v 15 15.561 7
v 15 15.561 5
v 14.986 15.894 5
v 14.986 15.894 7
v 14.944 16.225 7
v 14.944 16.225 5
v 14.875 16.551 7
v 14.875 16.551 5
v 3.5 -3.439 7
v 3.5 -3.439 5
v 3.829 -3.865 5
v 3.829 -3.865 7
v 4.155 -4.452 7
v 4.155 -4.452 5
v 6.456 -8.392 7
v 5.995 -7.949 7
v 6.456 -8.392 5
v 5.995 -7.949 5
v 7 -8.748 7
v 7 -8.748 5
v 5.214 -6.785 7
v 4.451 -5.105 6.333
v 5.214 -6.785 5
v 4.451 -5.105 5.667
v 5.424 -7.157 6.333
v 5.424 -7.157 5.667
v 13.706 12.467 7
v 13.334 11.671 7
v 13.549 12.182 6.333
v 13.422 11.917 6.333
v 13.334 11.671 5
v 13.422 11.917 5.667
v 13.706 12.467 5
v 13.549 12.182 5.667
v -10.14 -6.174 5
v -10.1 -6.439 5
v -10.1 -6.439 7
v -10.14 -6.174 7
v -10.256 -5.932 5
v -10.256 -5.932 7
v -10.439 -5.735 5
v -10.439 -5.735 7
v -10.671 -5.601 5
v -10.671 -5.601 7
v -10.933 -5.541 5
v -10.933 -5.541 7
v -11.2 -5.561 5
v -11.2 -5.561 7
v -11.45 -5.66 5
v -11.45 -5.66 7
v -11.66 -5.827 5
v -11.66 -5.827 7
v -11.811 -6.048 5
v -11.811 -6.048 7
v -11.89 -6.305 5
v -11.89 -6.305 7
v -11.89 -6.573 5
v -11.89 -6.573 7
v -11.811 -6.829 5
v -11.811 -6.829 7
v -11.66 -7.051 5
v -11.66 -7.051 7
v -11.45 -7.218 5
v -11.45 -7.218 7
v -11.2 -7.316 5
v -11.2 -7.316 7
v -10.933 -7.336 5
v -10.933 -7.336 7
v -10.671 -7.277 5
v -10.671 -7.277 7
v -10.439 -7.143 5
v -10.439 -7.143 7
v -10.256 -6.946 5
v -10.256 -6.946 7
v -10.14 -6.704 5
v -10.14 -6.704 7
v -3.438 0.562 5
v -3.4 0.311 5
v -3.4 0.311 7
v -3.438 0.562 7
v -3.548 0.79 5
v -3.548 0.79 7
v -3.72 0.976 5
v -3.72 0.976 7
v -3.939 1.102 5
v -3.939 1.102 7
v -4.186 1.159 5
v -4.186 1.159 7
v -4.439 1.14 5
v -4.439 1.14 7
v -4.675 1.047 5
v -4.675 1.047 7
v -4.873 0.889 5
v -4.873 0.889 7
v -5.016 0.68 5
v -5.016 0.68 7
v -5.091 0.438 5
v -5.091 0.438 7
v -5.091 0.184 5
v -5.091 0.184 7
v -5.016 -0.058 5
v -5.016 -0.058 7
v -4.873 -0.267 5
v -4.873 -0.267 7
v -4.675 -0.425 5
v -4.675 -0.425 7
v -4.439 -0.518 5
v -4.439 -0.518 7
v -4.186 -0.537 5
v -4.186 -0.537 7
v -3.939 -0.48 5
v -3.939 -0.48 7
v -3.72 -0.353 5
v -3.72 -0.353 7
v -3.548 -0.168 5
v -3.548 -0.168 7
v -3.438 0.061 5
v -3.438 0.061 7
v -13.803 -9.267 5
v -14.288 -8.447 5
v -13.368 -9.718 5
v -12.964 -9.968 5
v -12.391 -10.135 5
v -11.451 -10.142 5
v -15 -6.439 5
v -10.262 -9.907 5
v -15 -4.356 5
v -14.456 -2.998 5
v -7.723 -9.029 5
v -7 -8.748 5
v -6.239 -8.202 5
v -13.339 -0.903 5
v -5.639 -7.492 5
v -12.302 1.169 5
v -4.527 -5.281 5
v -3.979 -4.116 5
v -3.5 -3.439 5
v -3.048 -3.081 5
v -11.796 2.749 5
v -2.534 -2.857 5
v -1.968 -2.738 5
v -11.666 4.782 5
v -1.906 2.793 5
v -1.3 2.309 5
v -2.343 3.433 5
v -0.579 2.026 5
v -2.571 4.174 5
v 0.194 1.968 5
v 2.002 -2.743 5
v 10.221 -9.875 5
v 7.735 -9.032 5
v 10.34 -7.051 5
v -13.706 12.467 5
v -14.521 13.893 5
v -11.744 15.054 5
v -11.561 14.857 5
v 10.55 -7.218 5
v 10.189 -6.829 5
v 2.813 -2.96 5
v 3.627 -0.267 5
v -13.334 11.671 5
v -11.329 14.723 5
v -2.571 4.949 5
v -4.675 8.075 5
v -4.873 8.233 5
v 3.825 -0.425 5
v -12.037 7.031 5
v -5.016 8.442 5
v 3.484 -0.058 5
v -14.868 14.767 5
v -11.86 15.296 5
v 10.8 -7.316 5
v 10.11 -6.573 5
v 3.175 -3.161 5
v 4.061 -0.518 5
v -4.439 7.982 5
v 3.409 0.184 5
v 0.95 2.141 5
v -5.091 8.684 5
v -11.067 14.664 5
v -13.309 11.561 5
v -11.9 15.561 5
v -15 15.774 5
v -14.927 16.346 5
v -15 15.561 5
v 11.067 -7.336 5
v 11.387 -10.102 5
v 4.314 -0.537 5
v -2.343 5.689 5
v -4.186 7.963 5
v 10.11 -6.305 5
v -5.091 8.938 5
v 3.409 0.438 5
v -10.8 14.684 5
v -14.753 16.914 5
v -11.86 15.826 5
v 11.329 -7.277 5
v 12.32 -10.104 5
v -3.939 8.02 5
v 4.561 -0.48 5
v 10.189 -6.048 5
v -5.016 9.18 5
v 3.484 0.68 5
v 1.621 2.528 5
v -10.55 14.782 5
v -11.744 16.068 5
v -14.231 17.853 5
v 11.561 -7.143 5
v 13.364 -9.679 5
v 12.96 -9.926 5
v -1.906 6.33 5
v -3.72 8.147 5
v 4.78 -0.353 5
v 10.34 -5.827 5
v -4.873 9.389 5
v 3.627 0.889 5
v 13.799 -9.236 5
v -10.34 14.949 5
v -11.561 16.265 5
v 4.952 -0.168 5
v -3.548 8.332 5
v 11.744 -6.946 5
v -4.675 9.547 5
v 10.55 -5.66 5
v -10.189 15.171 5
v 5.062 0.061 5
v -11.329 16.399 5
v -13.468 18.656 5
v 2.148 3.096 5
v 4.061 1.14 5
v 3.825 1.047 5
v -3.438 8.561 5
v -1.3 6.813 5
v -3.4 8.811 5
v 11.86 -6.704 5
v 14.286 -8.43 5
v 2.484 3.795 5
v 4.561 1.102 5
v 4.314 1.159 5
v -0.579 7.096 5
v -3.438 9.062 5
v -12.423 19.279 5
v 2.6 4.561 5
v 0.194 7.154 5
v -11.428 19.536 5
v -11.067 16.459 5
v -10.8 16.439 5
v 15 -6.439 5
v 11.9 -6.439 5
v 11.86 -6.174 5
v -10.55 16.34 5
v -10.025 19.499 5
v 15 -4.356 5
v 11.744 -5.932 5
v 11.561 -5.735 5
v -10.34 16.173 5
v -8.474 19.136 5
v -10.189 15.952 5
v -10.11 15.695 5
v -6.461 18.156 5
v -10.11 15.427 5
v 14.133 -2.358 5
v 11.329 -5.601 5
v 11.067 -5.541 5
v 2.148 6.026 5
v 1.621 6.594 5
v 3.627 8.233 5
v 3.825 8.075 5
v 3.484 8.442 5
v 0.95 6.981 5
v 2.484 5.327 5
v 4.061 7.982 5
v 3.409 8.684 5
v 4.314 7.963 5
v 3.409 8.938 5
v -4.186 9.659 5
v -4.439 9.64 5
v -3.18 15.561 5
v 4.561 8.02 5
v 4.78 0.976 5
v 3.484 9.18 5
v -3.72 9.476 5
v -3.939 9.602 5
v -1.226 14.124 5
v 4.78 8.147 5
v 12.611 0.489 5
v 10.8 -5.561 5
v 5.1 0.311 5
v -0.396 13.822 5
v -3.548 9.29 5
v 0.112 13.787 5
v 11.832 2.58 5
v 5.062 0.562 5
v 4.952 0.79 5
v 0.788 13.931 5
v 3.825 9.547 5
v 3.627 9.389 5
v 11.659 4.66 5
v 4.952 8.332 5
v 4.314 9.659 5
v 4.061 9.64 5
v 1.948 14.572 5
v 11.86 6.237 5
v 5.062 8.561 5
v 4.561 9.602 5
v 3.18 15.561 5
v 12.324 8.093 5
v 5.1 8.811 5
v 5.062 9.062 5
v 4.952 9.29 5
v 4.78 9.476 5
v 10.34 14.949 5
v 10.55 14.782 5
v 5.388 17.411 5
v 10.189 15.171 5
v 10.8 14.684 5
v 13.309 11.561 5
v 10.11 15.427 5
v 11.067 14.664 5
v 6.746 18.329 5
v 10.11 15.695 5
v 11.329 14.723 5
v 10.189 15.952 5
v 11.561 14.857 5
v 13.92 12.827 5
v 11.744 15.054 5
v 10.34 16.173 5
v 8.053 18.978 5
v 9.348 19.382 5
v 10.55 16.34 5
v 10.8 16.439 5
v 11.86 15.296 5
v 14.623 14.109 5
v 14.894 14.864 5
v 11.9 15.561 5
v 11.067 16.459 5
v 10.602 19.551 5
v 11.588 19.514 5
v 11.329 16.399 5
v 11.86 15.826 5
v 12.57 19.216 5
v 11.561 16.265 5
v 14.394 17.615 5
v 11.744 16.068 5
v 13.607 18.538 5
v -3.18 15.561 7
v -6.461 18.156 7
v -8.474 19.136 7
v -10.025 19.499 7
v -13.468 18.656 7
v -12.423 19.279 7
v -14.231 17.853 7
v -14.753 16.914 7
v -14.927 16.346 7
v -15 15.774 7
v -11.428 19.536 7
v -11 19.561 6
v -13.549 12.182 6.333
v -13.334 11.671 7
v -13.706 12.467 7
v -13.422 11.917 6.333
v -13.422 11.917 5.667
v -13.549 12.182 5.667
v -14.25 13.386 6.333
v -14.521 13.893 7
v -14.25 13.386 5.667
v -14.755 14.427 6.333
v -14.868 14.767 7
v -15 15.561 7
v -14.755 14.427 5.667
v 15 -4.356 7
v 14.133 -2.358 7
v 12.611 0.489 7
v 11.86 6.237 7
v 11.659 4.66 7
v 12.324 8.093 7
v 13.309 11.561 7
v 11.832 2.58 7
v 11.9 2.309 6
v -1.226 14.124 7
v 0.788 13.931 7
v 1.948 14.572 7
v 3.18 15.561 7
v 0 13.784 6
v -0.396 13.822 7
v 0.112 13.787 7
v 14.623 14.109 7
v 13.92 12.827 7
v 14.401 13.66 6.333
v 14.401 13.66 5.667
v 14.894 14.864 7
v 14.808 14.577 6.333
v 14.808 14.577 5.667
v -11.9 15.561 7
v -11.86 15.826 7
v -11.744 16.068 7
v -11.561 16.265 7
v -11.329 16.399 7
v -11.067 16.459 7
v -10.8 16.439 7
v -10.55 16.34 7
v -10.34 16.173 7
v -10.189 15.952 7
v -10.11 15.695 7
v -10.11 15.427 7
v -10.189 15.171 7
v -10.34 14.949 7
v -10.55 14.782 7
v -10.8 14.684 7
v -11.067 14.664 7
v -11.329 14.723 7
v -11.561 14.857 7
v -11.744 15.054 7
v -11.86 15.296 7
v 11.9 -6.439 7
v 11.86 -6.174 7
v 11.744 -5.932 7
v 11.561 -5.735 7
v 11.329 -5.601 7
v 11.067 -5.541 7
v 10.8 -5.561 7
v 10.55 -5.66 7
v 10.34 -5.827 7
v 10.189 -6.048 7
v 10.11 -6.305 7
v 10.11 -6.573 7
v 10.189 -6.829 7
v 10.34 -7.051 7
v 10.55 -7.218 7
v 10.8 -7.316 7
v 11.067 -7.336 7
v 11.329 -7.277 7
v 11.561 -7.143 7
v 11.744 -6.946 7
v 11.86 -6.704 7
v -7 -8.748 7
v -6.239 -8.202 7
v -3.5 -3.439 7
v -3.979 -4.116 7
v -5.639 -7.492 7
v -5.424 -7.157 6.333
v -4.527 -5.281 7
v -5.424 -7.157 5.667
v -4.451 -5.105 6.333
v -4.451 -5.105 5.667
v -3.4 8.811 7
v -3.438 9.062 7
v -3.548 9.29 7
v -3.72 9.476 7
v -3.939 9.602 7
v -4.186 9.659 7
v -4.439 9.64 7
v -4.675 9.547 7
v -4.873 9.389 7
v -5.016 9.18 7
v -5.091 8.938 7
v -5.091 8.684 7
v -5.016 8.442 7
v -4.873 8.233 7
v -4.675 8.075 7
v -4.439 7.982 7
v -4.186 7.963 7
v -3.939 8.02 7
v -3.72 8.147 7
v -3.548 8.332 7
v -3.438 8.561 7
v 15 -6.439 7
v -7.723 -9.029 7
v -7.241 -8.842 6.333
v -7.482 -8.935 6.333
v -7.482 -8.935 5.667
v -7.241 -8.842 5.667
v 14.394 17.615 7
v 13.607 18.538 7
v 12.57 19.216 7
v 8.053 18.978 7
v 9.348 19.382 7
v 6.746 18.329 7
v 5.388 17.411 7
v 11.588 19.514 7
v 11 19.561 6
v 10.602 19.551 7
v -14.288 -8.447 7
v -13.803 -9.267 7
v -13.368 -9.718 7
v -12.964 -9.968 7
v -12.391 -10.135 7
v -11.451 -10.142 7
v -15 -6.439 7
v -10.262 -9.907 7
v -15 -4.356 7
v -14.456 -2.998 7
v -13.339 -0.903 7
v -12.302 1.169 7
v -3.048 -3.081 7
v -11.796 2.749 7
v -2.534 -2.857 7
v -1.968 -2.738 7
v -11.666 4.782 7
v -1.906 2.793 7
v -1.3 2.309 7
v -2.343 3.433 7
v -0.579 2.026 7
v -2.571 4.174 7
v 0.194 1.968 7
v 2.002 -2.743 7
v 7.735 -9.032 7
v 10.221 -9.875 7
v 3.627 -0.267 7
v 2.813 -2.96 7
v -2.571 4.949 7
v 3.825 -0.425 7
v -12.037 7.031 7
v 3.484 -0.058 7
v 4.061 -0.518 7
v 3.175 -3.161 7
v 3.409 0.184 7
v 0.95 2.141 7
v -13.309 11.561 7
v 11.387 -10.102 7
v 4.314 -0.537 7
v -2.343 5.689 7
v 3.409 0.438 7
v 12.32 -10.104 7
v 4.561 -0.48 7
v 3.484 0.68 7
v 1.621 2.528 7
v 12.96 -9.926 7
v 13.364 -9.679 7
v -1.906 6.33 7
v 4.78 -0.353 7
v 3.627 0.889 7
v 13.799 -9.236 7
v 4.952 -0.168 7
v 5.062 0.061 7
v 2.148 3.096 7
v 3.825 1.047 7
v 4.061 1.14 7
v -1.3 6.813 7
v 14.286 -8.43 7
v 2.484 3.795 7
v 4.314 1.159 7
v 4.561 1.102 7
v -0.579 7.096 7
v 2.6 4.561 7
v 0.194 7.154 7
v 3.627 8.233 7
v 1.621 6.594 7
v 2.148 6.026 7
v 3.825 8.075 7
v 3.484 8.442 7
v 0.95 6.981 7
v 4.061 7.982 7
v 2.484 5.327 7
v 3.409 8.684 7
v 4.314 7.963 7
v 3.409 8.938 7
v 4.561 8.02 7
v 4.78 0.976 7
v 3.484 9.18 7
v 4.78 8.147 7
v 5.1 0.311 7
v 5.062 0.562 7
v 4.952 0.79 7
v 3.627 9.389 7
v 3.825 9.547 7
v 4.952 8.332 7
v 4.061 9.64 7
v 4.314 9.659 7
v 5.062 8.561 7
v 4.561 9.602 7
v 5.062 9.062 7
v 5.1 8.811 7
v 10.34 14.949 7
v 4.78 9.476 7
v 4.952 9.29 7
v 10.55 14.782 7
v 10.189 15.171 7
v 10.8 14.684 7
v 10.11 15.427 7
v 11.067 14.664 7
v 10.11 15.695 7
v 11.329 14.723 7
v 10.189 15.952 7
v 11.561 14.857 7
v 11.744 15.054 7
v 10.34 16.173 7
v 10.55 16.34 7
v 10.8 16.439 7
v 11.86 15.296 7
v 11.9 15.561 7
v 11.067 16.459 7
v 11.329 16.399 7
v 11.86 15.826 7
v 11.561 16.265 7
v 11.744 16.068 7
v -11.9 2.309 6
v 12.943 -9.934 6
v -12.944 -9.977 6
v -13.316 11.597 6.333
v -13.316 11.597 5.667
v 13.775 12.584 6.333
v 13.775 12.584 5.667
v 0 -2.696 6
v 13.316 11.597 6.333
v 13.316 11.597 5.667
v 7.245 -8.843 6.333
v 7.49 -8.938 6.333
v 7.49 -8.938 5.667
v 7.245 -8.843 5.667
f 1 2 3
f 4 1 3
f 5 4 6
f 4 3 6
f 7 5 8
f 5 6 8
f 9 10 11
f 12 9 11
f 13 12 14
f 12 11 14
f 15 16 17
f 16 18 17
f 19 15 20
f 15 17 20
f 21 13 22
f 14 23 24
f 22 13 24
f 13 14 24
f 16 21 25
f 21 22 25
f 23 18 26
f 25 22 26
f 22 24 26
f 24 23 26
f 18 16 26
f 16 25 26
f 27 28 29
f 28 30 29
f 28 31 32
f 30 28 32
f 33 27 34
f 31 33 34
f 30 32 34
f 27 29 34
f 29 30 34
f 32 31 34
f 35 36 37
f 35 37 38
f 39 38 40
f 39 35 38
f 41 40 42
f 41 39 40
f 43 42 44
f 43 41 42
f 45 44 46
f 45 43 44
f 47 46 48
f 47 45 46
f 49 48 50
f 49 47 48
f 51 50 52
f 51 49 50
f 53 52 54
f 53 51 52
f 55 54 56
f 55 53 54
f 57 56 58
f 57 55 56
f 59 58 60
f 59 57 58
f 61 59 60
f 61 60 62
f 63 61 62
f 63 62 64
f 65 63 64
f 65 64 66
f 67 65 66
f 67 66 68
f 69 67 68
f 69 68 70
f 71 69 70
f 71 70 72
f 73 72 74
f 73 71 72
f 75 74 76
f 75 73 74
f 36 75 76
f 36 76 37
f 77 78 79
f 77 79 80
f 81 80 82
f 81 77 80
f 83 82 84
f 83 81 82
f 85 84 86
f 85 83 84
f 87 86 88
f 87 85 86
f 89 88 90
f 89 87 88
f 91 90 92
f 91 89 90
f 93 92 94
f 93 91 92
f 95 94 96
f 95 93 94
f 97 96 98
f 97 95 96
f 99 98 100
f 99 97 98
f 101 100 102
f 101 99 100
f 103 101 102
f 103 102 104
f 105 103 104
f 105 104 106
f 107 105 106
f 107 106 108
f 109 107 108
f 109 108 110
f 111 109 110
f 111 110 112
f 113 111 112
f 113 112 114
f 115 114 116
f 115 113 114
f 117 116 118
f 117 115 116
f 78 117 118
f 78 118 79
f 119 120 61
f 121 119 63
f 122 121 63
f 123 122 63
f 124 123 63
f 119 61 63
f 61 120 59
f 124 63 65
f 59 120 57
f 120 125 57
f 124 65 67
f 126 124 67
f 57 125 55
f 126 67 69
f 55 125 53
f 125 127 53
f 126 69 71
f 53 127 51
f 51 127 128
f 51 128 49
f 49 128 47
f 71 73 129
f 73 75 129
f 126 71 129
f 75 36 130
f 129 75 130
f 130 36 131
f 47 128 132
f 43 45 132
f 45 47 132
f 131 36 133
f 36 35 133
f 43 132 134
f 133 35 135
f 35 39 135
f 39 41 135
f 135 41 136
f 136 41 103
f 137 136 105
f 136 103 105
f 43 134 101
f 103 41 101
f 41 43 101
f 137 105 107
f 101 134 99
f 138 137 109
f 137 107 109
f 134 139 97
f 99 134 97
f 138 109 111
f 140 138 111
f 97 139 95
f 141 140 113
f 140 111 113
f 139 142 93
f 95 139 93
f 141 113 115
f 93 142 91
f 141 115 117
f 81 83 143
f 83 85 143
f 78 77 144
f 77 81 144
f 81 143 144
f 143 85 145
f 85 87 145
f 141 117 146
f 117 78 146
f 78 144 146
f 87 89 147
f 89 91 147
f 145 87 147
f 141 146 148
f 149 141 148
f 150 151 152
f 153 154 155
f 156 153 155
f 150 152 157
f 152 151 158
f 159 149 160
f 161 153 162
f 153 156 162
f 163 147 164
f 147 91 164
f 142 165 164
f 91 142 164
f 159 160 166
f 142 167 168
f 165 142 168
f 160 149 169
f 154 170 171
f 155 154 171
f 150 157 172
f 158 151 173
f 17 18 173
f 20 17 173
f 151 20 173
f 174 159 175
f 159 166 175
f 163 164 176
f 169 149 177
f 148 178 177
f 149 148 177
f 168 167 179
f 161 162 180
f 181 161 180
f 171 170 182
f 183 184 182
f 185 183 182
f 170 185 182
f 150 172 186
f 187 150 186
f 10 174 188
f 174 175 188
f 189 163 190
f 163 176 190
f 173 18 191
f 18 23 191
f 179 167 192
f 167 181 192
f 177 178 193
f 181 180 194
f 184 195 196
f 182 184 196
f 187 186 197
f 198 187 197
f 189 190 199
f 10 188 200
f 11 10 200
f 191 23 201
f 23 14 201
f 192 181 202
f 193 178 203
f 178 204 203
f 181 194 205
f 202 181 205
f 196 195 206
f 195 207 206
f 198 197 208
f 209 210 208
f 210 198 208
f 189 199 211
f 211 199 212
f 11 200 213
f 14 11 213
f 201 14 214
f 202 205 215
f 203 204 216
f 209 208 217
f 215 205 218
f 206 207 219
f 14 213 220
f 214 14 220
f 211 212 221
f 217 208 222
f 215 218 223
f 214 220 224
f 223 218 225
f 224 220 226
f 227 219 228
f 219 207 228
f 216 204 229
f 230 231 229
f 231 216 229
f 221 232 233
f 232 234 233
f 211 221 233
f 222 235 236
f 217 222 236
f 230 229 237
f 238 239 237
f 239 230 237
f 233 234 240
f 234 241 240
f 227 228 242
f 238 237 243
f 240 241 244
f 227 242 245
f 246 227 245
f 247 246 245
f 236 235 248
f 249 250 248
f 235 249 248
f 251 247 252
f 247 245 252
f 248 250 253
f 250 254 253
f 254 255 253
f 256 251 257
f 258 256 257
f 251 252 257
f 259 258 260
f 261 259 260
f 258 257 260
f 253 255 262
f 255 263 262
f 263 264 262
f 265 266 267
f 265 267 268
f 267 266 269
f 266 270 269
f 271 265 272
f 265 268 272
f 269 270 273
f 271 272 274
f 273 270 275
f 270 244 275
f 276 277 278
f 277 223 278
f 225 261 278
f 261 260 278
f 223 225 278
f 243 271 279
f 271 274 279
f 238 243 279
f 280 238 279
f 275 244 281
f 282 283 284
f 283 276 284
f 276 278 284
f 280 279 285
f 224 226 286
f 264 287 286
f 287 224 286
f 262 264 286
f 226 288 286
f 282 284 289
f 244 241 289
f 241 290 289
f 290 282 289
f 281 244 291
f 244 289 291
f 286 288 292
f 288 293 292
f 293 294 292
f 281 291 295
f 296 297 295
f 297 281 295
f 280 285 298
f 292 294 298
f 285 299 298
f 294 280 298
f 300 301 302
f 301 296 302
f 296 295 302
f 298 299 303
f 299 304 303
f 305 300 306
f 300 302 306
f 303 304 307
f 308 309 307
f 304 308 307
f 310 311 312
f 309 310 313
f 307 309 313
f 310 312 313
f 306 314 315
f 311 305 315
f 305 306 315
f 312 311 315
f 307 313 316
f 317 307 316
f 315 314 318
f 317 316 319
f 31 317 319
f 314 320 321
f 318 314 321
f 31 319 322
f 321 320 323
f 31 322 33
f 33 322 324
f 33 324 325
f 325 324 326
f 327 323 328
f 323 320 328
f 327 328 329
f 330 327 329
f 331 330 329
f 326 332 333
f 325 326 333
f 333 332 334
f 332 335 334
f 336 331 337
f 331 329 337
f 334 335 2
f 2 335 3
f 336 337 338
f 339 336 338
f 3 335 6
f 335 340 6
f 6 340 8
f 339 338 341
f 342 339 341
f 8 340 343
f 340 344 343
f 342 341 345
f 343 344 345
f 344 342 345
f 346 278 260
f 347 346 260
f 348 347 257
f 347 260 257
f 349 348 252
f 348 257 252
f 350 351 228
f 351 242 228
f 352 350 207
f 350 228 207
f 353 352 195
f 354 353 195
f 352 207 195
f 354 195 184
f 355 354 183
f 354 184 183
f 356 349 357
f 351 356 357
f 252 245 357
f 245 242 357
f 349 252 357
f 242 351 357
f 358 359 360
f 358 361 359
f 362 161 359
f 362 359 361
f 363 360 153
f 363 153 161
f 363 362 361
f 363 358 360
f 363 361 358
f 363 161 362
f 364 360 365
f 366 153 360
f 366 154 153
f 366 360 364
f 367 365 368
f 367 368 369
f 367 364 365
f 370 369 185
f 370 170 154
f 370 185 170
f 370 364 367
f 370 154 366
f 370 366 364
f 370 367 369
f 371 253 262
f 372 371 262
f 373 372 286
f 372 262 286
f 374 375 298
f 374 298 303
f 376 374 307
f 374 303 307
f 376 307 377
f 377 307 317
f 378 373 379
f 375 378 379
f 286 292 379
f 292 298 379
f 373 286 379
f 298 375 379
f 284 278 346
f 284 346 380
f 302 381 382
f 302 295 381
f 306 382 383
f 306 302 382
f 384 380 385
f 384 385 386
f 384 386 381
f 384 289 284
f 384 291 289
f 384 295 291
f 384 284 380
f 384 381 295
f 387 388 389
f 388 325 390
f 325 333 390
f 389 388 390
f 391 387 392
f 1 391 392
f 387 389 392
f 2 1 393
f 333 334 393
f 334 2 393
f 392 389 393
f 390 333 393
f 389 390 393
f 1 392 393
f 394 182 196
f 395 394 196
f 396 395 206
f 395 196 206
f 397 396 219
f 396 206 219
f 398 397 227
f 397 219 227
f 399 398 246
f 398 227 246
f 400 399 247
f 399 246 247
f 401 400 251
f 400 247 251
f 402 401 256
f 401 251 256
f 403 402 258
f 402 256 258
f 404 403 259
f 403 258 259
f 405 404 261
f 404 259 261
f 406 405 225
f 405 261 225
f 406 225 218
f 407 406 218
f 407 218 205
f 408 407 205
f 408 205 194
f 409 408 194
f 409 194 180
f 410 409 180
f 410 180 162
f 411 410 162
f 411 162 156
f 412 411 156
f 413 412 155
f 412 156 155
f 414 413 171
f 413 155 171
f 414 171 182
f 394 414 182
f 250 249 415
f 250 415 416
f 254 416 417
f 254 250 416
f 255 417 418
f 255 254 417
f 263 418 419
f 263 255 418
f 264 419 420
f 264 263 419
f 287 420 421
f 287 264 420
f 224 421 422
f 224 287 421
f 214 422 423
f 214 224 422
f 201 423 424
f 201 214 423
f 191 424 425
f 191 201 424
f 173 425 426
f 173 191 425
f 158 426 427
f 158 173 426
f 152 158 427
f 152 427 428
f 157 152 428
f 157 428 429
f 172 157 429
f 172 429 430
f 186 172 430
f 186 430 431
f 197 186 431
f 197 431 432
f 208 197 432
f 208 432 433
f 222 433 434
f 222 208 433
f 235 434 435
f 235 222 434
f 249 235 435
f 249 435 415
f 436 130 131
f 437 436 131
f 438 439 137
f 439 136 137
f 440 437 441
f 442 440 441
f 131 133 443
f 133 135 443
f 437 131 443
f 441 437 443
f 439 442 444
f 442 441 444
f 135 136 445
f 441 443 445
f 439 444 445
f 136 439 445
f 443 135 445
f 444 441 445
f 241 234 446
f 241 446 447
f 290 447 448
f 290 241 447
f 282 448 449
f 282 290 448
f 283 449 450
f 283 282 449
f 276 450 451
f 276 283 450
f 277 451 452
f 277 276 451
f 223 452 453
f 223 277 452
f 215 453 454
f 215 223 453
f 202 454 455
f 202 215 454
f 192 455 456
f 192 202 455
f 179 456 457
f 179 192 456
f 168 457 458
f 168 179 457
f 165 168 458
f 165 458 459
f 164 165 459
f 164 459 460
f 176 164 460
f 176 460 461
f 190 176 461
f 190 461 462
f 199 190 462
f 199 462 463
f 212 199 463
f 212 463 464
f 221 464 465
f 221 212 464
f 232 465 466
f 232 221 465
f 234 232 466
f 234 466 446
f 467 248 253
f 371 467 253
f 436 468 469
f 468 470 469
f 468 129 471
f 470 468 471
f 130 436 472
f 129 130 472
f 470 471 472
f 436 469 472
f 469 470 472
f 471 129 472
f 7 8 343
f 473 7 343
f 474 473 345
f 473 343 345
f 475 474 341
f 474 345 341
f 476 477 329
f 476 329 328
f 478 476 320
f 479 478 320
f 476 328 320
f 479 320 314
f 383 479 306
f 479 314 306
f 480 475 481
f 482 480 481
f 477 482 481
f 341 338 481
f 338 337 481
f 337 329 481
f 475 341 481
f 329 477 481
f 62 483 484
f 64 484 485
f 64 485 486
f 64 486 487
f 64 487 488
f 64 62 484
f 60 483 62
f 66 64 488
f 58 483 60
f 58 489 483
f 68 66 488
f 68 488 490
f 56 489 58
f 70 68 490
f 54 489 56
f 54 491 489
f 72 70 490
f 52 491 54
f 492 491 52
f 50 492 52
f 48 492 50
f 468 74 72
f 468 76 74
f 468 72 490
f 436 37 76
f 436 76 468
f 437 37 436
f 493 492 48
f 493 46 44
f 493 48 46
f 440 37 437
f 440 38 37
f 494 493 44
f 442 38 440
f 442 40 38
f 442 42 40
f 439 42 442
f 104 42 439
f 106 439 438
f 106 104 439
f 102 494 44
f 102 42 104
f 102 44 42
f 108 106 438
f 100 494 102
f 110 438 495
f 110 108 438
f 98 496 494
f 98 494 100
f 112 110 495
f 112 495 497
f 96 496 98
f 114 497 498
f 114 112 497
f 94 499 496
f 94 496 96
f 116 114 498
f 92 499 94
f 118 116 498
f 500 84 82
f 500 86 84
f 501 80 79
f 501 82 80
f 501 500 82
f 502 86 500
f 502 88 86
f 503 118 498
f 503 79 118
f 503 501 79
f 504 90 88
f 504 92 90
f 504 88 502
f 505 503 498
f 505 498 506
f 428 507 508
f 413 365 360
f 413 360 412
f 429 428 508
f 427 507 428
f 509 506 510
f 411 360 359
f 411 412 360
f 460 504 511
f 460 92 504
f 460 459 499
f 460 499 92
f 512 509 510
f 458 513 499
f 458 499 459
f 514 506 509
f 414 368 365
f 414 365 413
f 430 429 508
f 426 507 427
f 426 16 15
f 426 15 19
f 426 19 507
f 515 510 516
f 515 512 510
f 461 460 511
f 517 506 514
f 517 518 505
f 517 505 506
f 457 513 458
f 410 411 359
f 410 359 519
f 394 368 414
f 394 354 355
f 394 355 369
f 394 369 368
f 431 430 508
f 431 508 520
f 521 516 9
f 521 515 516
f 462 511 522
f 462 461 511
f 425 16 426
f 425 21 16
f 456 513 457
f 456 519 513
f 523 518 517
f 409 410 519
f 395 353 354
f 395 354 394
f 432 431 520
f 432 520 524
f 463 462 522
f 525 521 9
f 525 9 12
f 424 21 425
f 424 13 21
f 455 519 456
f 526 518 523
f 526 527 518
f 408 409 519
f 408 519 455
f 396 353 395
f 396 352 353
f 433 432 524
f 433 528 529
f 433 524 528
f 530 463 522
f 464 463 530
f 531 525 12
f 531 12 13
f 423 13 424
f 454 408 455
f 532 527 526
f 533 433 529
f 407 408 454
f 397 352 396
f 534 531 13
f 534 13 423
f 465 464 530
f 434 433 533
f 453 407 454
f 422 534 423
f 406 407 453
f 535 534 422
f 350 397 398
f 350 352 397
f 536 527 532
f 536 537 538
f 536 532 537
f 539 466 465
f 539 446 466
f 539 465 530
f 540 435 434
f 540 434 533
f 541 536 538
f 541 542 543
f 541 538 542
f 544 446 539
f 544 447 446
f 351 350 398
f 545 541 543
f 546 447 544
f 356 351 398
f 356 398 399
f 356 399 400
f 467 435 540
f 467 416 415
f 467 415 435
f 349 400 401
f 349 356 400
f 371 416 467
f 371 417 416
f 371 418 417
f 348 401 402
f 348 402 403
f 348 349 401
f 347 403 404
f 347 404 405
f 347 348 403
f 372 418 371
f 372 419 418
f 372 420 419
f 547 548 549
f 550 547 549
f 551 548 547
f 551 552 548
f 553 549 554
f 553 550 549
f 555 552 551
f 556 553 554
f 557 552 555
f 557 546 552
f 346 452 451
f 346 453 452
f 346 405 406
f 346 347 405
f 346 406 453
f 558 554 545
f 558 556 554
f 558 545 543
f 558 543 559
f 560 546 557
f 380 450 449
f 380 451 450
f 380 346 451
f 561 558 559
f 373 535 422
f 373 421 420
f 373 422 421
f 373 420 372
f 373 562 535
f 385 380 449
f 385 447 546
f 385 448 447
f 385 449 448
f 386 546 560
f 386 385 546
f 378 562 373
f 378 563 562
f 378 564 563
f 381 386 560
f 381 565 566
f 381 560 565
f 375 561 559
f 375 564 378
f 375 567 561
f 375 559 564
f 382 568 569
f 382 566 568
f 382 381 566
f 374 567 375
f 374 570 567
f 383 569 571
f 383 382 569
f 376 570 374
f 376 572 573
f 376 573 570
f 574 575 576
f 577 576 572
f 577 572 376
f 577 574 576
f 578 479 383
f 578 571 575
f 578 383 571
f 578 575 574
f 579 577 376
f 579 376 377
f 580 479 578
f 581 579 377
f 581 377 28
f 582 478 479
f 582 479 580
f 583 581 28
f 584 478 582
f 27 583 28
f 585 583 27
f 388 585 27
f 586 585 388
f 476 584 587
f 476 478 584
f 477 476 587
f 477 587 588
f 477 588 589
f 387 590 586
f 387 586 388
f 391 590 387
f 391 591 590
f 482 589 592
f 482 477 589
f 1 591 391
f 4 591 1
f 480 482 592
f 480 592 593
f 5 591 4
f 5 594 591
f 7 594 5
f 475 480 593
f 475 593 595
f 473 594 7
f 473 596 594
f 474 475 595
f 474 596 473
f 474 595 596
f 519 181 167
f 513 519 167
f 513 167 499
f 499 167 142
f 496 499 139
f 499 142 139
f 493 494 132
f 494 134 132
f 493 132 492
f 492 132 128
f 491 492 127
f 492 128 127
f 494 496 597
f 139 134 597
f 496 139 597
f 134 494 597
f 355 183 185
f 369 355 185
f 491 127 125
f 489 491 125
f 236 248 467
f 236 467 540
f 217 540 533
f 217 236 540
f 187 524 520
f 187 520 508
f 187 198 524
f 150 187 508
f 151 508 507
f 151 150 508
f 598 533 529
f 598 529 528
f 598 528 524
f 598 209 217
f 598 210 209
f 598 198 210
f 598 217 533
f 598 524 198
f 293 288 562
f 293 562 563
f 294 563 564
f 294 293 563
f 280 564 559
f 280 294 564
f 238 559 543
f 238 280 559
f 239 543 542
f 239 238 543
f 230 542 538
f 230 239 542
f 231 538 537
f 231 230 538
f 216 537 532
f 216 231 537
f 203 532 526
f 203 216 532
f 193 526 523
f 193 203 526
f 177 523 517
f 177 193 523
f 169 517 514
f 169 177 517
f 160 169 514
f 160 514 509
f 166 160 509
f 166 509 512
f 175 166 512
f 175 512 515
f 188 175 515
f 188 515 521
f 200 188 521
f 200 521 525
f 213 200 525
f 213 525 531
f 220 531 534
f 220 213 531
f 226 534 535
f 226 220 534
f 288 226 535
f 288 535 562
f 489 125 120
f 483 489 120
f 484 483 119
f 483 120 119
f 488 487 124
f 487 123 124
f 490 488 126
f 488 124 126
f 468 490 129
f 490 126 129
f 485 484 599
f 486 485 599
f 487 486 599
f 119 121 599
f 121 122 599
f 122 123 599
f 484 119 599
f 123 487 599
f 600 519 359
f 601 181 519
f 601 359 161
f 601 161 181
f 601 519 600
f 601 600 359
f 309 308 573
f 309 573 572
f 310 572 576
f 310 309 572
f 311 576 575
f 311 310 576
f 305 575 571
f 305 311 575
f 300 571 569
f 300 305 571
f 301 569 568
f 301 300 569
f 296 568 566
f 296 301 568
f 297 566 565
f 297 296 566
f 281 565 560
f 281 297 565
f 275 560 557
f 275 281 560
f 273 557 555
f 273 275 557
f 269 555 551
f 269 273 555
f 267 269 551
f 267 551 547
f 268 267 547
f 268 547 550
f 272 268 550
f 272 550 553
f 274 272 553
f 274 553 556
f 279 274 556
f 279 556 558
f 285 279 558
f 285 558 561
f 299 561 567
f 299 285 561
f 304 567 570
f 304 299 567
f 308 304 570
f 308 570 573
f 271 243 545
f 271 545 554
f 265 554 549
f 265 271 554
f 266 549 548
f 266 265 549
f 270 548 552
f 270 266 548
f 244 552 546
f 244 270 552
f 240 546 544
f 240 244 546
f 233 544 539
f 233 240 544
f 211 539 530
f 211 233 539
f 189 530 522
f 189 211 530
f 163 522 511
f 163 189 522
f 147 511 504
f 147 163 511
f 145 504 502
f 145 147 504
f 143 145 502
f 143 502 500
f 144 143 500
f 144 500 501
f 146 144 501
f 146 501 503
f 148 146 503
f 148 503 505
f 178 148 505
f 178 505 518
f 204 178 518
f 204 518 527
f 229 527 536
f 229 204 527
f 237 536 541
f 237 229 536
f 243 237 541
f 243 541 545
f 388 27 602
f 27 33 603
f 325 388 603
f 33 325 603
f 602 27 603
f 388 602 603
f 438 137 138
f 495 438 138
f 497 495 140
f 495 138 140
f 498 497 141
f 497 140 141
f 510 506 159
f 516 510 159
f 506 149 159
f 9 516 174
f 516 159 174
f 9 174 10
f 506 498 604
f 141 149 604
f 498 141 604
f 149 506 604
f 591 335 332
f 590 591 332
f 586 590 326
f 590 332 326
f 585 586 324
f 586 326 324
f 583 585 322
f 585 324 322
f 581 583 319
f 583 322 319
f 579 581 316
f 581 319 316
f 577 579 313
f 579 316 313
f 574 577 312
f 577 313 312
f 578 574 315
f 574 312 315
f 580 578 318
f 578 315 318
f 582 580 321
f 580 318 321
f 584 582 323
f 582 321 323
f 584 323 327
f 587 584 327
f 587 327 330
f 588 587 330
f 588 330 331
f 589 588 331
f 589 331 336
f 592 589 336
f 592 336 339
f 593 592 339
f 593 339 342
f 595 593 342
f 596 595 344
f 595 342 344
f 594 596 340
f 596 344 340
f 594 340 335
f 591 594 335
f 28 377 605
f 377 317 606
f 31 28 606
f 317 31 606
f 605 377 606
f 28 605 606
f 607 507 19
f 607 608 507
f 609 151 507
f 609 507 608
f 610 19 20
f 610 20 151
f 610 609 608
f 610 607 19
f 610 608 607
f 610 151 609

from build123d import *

# Parameters (mm, degrees)
F3_R     = 0.9
F3_R_2   = 0.85
F3_R_3   = 2.6
F4_DEPTH = 2


with BuildPart() as f4:
    # F3 (on offset) → F4 (new body)
    with BuildSketch(Plane.XY.offset(5)):
        with BuildLine():
            add(Edge.make_bspline(
                [(13.5840897294, 15.5610671266), (13.3511585546, 17.1029676873), (12.6074515763, 18.5088140753), (11, 19.5610671266)],
                knots=[0.7544415636, 0.7544415636, 0.7544415636, 0.7544415636, 0.7967305031, 0.7967305031, 0.7967305031, 0.7967305031], degree=3))
            ThreePointArc((11, 19.5610671266), (8.1715728753, 18.3894942513), (7, 15.5610671266))
            Line((7, 15.5610671266), (10.1, 15.5610671266))
            ThreePointArc((10.1, 15.5610671266), (11, 16.4610671266), (11.9, 15.5610671266))
            Line((11.9, 15.5610671266), (13.5840897294, 15.5610671266))
        make_face()
        with BuildLine():
            add(Edge.make_bspline(
                [(14.8754677726, 16.5513951244), (14.4362064353, 18.1121245067), (12.8992511156, 19.5610671266), (11, 19.5610671266)],
                knots=[0.5598679958, 0.5598679958, 0.5598679958, 0.5598679958, 1, 1, 1, 1], degree=3))
            add(Edge.make_bspline(
                [(13.5840897294, 15.5610671266), (13.3511585546, 17.1029676873), (12.6074515763, 18.5088140753), (11, 19.5610671266)],
                knots=[0.7544415636, 0.7544415636, 0.7544415636, 0.7544415636, 0.7967305031, 0.7967305031, 0.7967305031, 0.7967305031], degree=3))
            Line((13.5840897294, 15.5610671266), (15, 15.5610671266))
            ThreePointArc((15, 15.5610671266), (14.9687448325, 16.0601307044), (14.8754677726, 16.5513951244))
        make_face()
        with BuildLine():
            ThreePointArc((7, 15.5610671266), (8.1715728753, 18.3894942513), (11, 19.5610671266))
            add(Edge.make_bspline(
                [(3.1801327541, 15.5610671266), (5.1521059489, 17.258924835), (7.5281581703, 19.5610671266), (11, 19.5610671266)],
                knots=[0.6843780155, 0.6843780155, 0.6843780155, 0.6843780155, 1, 1, 1, 1], degree=3))
            Line((3.1801327541, 15.5610671266), (7, 15.5610671266))
        make_face()
        with BuildLine():
            add(Edge.make_bspline(
                [(-11, 19.5610671266), (-7.5281581703, 19.5610671266), (-5.1521059489, 17.258924835), (-3.1801327541, 15.5610671266)],
                knots=[0, 0, 0, 0, 0.3156219845, 0.3156219845, 0.3156219845, 0.3156219845], degree=3))
            add(Edge.make_bspline(
                [(-11, 19.5610671266), (-12.6074515763, 18.5088140753), (-13.3511585546, 17.1029676873), (-13.5840897294, 15.5610671266)],
                knots=[0.9225775171, 0.9225775171, 0.9225775171, 0.9225775171, 0.9648664566, 0.9648664566, 0.9648664566, 0.9648664566], degree=3))
            Line((-13.5840897294, 15.5610671266), (-11.9, 15.5610671266))
            ThreePointArc((-11.9, 15.5610671266), (-11, 16.4610671266), (-10.1, 15.5610671266))
            Line((-10.1, 15.5610671266), (-3.1801327541, 15.5610671266))
        make_face()
        with BuildLine():
            add(Edge.make_bspline(
                [(-11, 19.5610671266), (-12.6074515763, 18.5088140753), (-13.3511585546, 17.1029676873), (-13.5840897294, 15.5610671266)],
                knots=[0.9225775171, 0.9225775171, 0.9225775171, 0.9225775171, 0.9648664566, 0.9648664566, 0.9648664566, 0.9648664566], degree=3))
            add(Edge.make_bspline(
                [(-15, 15.7741791911), (-14.9345041339, 17.5934219618), (-13.2132485479, 19.5610671266), (-11, 19.5610671266)],
                knots=[0.4871023051, 0.4871023051, 0.4871023051, 0.4871023051, 1, 1, 1, 1], degree=3))
            Line((-15, 15.7741791911), (-15, 15.5610671266))
            Line((-15, 15.5610671266), (-13.5840897294, 15.5610671266))
        make_face()
        with BuildLine():
            Line((10.1, 15.5610671266), (7, 15.5610671266))
            ThreePointArc((7, 15.5610671266), (7.384697146, 13.8494639969), (8.4647926368, 12.4670852867))
            Line((8.4647926368, 12.4670852867), (13.4691565234, 12.4670852867))
            Line((13.4691565234, 12.4670852867), (13.492215644, 12.4670852867))
            add(Edge.make_bspline(
                [(13.492215644, 12.4670852867), (13.6721160747, 13.5160999102), (13.734281279, 14.5668660077), (13.5840897294, 15.5610671266)],
                knots=[0.7271741042, 0.7271741042, 0.7271741042, 0.7271741042, 0.7544415636, 0.7544415636, 0.7544415636, 0.7544415636], degree=3))
            Line((13.5840897294, 15.5610671266), (11.9, 15.5610671266))
            ThreePointArc((11.9, 15.5610671266), (11, 14.6610671266), (10.1, 15.5610671266))
        make_face()
        with BuildLine():
            ThreePointArc((8.4647926368, 12.4670852867), (7.384697146, 13.8494639969), (7, 15.5610671266))
            Line((7, 15.5610671266), (3.1801327541, 15.5610671266))
            add(Edge.make_bspline(
                [(-3.1801327541, 15.5610671266), (-2.0281581703, 14.5692235599), (0, 12.9979712148), (2.0281581703, 14.5692235599), (3.1801327541, 15.5610671266)],
                knots=[0.3156219845, 0.3156219845, 0.3156219845, 0.3156219845, 0.5, 0.6843780155, 0.6843780155, 0.6843780155, 0.6843780155], degree=3))
            Line((-3.1801327541, 15.5610671266), (-10.1, 15.5610671266))
            ThreePointArc((-10.1, 15.5610671266), (-11, 14.6610671266), (-11.9, 15.5610671266))
            Line((-11.9, 15.5610671266), (-13.5840897294, 15.5610671266))
            add(Edge.make_bspline(
                [(-13.5840897294, 15.5610671266), (-13.734281279, 14.5668660077), (-13.6721160747, 13.5160999102), (-13.492215644, 12.4670852867)],
                knots=[0.9648664566, 0.9648664566, 0.9648664566, 0.9648664566, 0.992133916, 0.992133916, 0.992133916, 0.992133916], degree=3))
            Line((-13.492215644, 12.4670852867), (-13.4691565234, 12.4670852867))
            Line((-13.4691565234, 12.4670852867), (8.4647926368, 12.4670852867))
        make_face()
        with BuildLine():
            Line((15, 15.5610671266), (13.5840897294, 15.5610671266))
            add(Edge.make_bspline(
                [(13.492215644, 12.4670852867), (13.6721160747, 13.5160999102), (13.734281279, 14.5668660077), (13.5840897294, 15.5610671266)],
                knots=[0.7271741042, 0.7271741042, 0.7271741042, 0.7271741042, 0.7544415636, 0.7544415636, 0.7544415636, 0.7544415636], degree=3))
            Line((13.492215644, 12.4670852867), (13.5352073632, 12.4670852867))
            ThreePointArc((13.5352073632, 12.4670852867), (13.7336426306, 12.6409304914), (13.9201867728, 12.8274780551))
            add(Edge.make_bspline(
                [(13.9201867728, 12.8274780551), (14.3914007653, 13.6110512692), (14.9629553276, 14.5497192982), (15, 15.5610671266)],
                knots=[0.1795179278, 0.1795179278, 0.1795179278, 0.1795179278, 0.4669985441, 0.4669985441, 0.4669985441, 0.4669985441], degree=3))
        make_face()
        with BuildLine():
            add(Edge.make_bspline(
                [(-13.5840897294, 15.5610671266), (-13.734281279, 14.5668660077), (-13.6721160747, 13.5160999102), (-13.492215644, 12.4670852867)],
                knots=[0.9648664566, 0.9648664566, 0.9648664566, 0.9648664566, 0.992133916, 0.992133916, 0.992133916, 0.992133916], degree=3))
            Line((-13.5840897294, 15.5610671266), (-15, 15.5610671266))
            add(Edge.make_bspline(
                [(-13.7063183417, 12.4670852867), (-14.1968968928, 13.3154705741), (-14.9570867675, 14.3895031275), (-15, 15.5610671266)],
                knots=[0.1339756897, 0.1339756897, 0.1339756897, 0.1339756897, 0.4669985441, 0.4669985441, 0.4669985441, 0.4669985441], degree=3))
            Line((-13.7063183417, 12.4670852867), (-13.492215644, 12.4670852867))
        make_face()
        with BuildLine():
            Line((13.4691565234, 12.4670852867), (8.4647926368, 12.4670852867))
            ThreePointArc((8.4647926368, 12.4670852867), (10.9507937826, 11.5613697945), (13.4583242546, 12.4056524377))
            Line((13.4583242546, 12.4056524377), (13.4691565234, 12.4670852867))
        make_face()
        with BuildLine():
            ThreePointArc((13.4583242546, 12.4056524377), (10.9507937826, 11.5613697945), (8.4647926368, 12.4670852867))
            Line((8.4647926368, 12.4670852867), (-13.4691565234, 12.4670852867))
            Line((-13.4691565234, 12.4670852867), (-13.3094010768, 11.5610671266))
            add(Edge.make_bspline(
                [(-13.3094010768, 11.5610671266), (-12.5871033108, 8.4210285266), (-9.9260749254, 3.2919220303), (-14.403876313, -2.3381175367), (-15, -4.3559935783)],
                knots=[0, 0, 0, 0, 0.0820790806, 0.1416655097, 0.1416655097, 0.1416655097, 0.1416655097], degree=3))
            Line((-15, -4.3559935783), (-15, -6.4389328734))
            add(Edge.make_bspline(
                [(-15, -6.4389328734), (-14.1595926628, -8.4371784368), (-10.2189124595, -9.723491879), (-7.7225640289, -9.0286027112)],
                knots=[0.1638195279, 0.1638195279, 0.1638195279, 0.1638195279, 0.2339911879, 0.2339911879, 0.2339911879, 0.2339911879], degree=3))
            add(Edge.make_bspline(
                [(-7.7225640289, -9.0286027112), (-7.4825681334, -8.9358330473), (-7.2413616339, -8.8417932594), (-7, -8.7483339502)],
                knots=[0.9423734081, 0.9423734081, 0.9423734081, 0.9423734081, 1, 1, 1, 1], degree=3))
            add(Edge.make_bspline(
                [(-7, -8.7483339502), (-4.9275830737, -7.6704662943), (-4.6345461271, -4.6287367083), (-3.5, -3.4389328734)],
                knots=[0.2412420108, 0.2412420108, 0.2412420108, 0.2412420108, 0.3089022709, 0.3089022709, 0.3089022709, 0.3089022709], degree=3))
            add(Edge.make_bspline(
                [(-3.5, -3.4389328734), (-2.6489806718, -2.5464649198), (0, -2.84548287), (2.6489806718, -2.5464649198), (3.5, -3.4389328734)],
                knots=[0.3089022709, 0.3089022709, 0.3089022709, 0.3089022709, 0.3596540101, 0.4104057492, 0.4104057492, 0.4104057492, 0.4104057492], degree=3))
            add(Edge.make_bspline(
                [(3.5, -3.4389328734), (4.6345461271, -4.6287367083), (4.9275830737, -7.6704662943), (7, -8.7483339502)],
                knots=[0.4104057492, 0.4104057492, 0.4104057492, 0.4104057492, 0.4780660094, 0.4780660094, 0.4780660094, 0.4780660094], degree=3))
            add(Edge.make_bspline(
                [(7.7349288931, -9.0320251809), (7.4908824059, -8.9385878573), (7.2455387097, -8.8434106938), (7, -8.7483339502)],
                knots=[0.9412809289, 0.9412809289, 0.9412809289, 0.9412809289, 1, 1, 1, 1], degree=3))
            add(Edge.make_bspline(
                [(7.7349288931, -9.0320251809), (10.2319042389, -9.7192464231), (14.1609789052, -8.4338823534), (15, -6.4389328734)],
                knots=[0.4854325797, 0.4854325797, 0.4854325797, 0.4854325797, 0.5554884923, 0.5554884923, 0.5554884923, 0.5554884923], degree=3))
            Line((15, -6.4389328734), (15, -4.3559935783))
            add(Edge.make_bspline(
                [(15, -4.3559935783), (14.403876313, -2.3381175367), (9.9260749254, 3.2919220303), (12.5871033108, 8.4210285266), (13.3094010768, 11.5610671266)],
                knots=[0.5776425105, 0.5776425105, 0.5776425105, 0.5776425105, 0.6372289396, 0.7193080202, 0.7193080202, 0.7193080202, 0.7193080202], degree=3))
            Line((13.3094010768, 11.5610671266), (13.4583242546, 12.4056524377))
        make_face()
        with Locations((-11, -6.4389328734)):
            Circle(F3_R, mode=Mode.SUBTRACT)
        with Locations((-4.25, 0.3110671266)):
            Circle(F3_R_2, mode=Mode.SUBTRACT)
        with Locations((0, 4.5610671266)):
            Circle(F3_R_3, mode=Mode.SUBTRACT)
        with Locations((11, -6.4389328734)):
            Circle(F3_R, mode=Mode.SUBTRACT)
        with Locations((4.25, 0.3110671266)):
            Circle(F3_R_2, mode=Mode.SUBTRACT)
        with Locations((-4.25, 8.8110671266)):
            Circle(F3_R_2, mode=Mode.SUBTRACT)
        with Locations((4.25, 8.8110671266)):
            Circle(F3_R_2, mode=Mode.SUBTRACT)
        with BuildLine():
            Line((13.5352073632, 12.4670852867), (13.492215644, 12.4670852867))
            add(Edge.make_bspline(
                [(13.4852520955, 12.4268172926), (13.4875924233, 12.4402395891), (13.4899136722, 12.4536622945), (13.492215644, 12.4670852867)],
                knots=[0.726825195, 0.726825195, 0.726825195, 0.726825195, 0.7271741042, 0.7271741042, 0.7271741042, 0.7271741042], degree=3))
            ThreePointArc((13.4852520955, 12.4268172926), (13.5103104732, 12.4468511212), (13.5352073632, 12.4670852867))
        make_face()
        with BuildLine():
            add(Edge.make_bspline(
                [(13.4852520955, 12.4268172926), (13.4875924233, 12.4402395891), (13.4899136722, 12.4536622945), (13.492215644, 12.4670852867)],
                knots=[0.726825195, 0.726825195, 0.726825195, 0.726825195, 0.7271741042, 0.7271741042, 0.7271741042, 0.7271741042], degree=3))
            Line((13.492215644, 12.4670852867), (13.4691565234, 12.4670852867))
            Line((13.4691565234, 12.4670852867), (13.4583242546, 12.4056524377))
            ThreePointArc((13.4583242546, 12.4056524377), (13.4718108282, 12.4162060438), (13.4852520955, 12.4268172926))
        make_face()
        with BuildLine():
            add(Edge.make_bspline(
                [(13.7063183417, 12.4670852867), (13.7734069659, 12.5831054462), (13.8455377753, 12.7033455891), (13.9201867728, 12.8274780551)],
                knots=[0.1339756897, 0.1339756897, 0.1339756897, 0.1339756897, 0.1795179278, 0.1795179278, 0.1795179278, 0.1795179278], degree=3))
            ThreePointArc((13.9201867728, 12.8274780551), (13.7336426306, 12.6409304914), (13.5352073632, 12.4670852867))
            Line((13.5352073632, 12.4670852867), (13.7063183417, 12.4670852867))
        make_face()
        with BuildLine():
            Line((-13.4691565234, 12.4670852867), (-13.492215644, 12.4670852867))
            add(Edge.make_bspline(
                [(-13.492215644, 12.4670852867), (-13.4466612755, 12.2014539119), (-13.3935576871, 11.9359348422), (-13.3344412049, 11.671474935)],
                knots=[0.992133916, 0.992133916, 0.992133916, 0.992133916, 0.9990385792, 0.9990385792, 0.9990385792, 0.9990385792], degree=3))
            add(Edge.make_bspline(
                [(-13.3094010768, 11.5610671266), (-13.3157403301, 11.597018819), (-13.324143718, 11.6338287797), (-13.3344412049, 11.671474935)],
                knots=[0, 0, 0, 0, 0.0185309619, 0.0185309619, 0.0185309619, 0.0185309619], degree=3))
            Line((-13.3094010768, 11.5610671266), (-13.4691565234, 12.4670852867))
        make_face()
        with BuildLine():
            add(Edge.make_bspline(
                [(-13.492215644, 12.4670852867), (-13.4466612755, 12.2014539119), (-13.3935576871, 11.9359348422), (-13.3344412049, 11.671474935)],
                knots=[0.992133916, 0.992133916, 0.992133916, 0.992133916, 0.9990385792, 0.9990385792, 0.9990385792, 0.9990385792], degree=3))
            Line((-13.492215644, 12.4670852867), (-13.7063183417, 12.4670852867))
            add(Edge.make_bspline(
                [(-13.3344412049, 11.671474935), (-13.3985927892, 11.9060040524), (-13.5362558173, 12.1729865265), (-13.7063183417, 12.4670852867)],
                knots=[0.0185309619, 0.0185309619, 0.0185309619, 0.0185309619, 0.1339756897, 0.1339756897, 0.1339756897, 0.1339756897], degree=3))
        make_face()
        with BuildLine():
            ThreePointArc((13.4852520955, 12.4268172926), (13.4718108282, 12.4162060438), (13.4583242546, 12.4056524377))
            Line((13.4583242546, 12.4056524377), (13.3094010768, 11.5610671266))
            add(Edge.make_bspline(
                [(13.3094010768, 11.5610671266), (13.3157403301, 11.597018819), (13.324143718, 11.6338287797), (13.3344412049, 11.671474935)],
                knots=[0, 0, 0, 0, 0.0185309619, 0.0185309619, 0.0185309619, 0.0185309619], degree=3))
            add(Edge.make_bspline(
                [(13.3344412049, 11.671474935), (13.390570389, 11.9225710471), (13.4412790174, 12.1746219822), (13.4852520955, 12.4268172926)],
                knots=[0.720269441, 0.720269441, 0.720269441, 0.720269441, 0.726825195, 0.726825195, 0.726825195, 0.726825195], degree=3))
        make_face()
        with BuildLine():
            ThreePointArc((13.5352073632, 12.4670852867), (13.5103104732, 12.4468511212), (13.4852520955, 12.4268172926))
            add(Edge.make_bspline(
                [(13.3344412049, 11.671474935), (13.390570389, 11.9225710471), (13.4412790174, 12.1746219822), (13.4852520955, 12.4268172926)],
                knots=[0.720269441, 0.720269441, 0.720269441, 0.720269441, 0.726825195, 0.726825195, 0.726825195, 0.726825195], degree=3))
            add(Edge.make_bspline(
                [(13.3344412049, 11.671474935), (13.3985927892, 11.9060040524), (13.5362558173, 12.1729865265), (13.7063183417, 12.4670852867)],
                knots=[0.0185309619, 0.0185309619, 0.0185309619, 0.0185309619, 0.1339756897, 0.1339756897, 0.1339756897, 0.1339756897], degree=3))
            Line((13.7063183417, 12.4670852867), (13.5352073632, 12.4670852867))
        make_face()
        with BuildLine():
            add(Edge.make_bspline(
                [(15, -6.4389328734), (14.55, -7.9389328734), (13.5150373015, -11.0782924932), (9.776904521, -9.8138300729), (7.7349288931, -9.0320251809)],
                knots=[0, 0, 0, 0, 0.4499691569, 0.9412809289, 0.9412809289, 0.9412809289, 0.9412809289], degree=3))
            add(Edge.make_bspline(
                [(7.7349288931, -9.0320251809), (10.2319042389, -9.7192464231), (14.1609789052, -8.4338823534), (15, -6.4389328734)],
                knots=[0.4854325797, 0.4854325797, 0.4854325797, 0.4854325797, 0.5554884923, 0.5554884923, 0.5554884923, 0.5554884923], degree=3))
        make_face()
        with BuildLine():
            add(Edge.make_bspline(
                [(-15, -6.4389328734), (-14.1595926628, -8.4371784368), (-10.2189124595, -9.723491879), (-7.7225640289, -9.0286027112)],
                knots=[0.1638195279, 0.1638195279, 0.1638195279, 0.1638195279, 0.2339911879, 0.2339911879, 0.2339911879, 0.2339911879], degree=3))
            add(Edge.make_bspline(
                [(-15, -6.4389328734), (-14.55, -7.9389328734), (-13.5253754228, -11.1597748555), (-9.7695536439, -9.8198601549), (-7.7225640289, -9.0286027112)],
                knots=[0, 0, 0, 0, 0.4508606887, 0.9423734081, 0.9423734081, 0.9423734081, 0.9423734081], degree=3))
        make_face()
    extrude(amount=F4_DEPTH)


solid = f4.part
